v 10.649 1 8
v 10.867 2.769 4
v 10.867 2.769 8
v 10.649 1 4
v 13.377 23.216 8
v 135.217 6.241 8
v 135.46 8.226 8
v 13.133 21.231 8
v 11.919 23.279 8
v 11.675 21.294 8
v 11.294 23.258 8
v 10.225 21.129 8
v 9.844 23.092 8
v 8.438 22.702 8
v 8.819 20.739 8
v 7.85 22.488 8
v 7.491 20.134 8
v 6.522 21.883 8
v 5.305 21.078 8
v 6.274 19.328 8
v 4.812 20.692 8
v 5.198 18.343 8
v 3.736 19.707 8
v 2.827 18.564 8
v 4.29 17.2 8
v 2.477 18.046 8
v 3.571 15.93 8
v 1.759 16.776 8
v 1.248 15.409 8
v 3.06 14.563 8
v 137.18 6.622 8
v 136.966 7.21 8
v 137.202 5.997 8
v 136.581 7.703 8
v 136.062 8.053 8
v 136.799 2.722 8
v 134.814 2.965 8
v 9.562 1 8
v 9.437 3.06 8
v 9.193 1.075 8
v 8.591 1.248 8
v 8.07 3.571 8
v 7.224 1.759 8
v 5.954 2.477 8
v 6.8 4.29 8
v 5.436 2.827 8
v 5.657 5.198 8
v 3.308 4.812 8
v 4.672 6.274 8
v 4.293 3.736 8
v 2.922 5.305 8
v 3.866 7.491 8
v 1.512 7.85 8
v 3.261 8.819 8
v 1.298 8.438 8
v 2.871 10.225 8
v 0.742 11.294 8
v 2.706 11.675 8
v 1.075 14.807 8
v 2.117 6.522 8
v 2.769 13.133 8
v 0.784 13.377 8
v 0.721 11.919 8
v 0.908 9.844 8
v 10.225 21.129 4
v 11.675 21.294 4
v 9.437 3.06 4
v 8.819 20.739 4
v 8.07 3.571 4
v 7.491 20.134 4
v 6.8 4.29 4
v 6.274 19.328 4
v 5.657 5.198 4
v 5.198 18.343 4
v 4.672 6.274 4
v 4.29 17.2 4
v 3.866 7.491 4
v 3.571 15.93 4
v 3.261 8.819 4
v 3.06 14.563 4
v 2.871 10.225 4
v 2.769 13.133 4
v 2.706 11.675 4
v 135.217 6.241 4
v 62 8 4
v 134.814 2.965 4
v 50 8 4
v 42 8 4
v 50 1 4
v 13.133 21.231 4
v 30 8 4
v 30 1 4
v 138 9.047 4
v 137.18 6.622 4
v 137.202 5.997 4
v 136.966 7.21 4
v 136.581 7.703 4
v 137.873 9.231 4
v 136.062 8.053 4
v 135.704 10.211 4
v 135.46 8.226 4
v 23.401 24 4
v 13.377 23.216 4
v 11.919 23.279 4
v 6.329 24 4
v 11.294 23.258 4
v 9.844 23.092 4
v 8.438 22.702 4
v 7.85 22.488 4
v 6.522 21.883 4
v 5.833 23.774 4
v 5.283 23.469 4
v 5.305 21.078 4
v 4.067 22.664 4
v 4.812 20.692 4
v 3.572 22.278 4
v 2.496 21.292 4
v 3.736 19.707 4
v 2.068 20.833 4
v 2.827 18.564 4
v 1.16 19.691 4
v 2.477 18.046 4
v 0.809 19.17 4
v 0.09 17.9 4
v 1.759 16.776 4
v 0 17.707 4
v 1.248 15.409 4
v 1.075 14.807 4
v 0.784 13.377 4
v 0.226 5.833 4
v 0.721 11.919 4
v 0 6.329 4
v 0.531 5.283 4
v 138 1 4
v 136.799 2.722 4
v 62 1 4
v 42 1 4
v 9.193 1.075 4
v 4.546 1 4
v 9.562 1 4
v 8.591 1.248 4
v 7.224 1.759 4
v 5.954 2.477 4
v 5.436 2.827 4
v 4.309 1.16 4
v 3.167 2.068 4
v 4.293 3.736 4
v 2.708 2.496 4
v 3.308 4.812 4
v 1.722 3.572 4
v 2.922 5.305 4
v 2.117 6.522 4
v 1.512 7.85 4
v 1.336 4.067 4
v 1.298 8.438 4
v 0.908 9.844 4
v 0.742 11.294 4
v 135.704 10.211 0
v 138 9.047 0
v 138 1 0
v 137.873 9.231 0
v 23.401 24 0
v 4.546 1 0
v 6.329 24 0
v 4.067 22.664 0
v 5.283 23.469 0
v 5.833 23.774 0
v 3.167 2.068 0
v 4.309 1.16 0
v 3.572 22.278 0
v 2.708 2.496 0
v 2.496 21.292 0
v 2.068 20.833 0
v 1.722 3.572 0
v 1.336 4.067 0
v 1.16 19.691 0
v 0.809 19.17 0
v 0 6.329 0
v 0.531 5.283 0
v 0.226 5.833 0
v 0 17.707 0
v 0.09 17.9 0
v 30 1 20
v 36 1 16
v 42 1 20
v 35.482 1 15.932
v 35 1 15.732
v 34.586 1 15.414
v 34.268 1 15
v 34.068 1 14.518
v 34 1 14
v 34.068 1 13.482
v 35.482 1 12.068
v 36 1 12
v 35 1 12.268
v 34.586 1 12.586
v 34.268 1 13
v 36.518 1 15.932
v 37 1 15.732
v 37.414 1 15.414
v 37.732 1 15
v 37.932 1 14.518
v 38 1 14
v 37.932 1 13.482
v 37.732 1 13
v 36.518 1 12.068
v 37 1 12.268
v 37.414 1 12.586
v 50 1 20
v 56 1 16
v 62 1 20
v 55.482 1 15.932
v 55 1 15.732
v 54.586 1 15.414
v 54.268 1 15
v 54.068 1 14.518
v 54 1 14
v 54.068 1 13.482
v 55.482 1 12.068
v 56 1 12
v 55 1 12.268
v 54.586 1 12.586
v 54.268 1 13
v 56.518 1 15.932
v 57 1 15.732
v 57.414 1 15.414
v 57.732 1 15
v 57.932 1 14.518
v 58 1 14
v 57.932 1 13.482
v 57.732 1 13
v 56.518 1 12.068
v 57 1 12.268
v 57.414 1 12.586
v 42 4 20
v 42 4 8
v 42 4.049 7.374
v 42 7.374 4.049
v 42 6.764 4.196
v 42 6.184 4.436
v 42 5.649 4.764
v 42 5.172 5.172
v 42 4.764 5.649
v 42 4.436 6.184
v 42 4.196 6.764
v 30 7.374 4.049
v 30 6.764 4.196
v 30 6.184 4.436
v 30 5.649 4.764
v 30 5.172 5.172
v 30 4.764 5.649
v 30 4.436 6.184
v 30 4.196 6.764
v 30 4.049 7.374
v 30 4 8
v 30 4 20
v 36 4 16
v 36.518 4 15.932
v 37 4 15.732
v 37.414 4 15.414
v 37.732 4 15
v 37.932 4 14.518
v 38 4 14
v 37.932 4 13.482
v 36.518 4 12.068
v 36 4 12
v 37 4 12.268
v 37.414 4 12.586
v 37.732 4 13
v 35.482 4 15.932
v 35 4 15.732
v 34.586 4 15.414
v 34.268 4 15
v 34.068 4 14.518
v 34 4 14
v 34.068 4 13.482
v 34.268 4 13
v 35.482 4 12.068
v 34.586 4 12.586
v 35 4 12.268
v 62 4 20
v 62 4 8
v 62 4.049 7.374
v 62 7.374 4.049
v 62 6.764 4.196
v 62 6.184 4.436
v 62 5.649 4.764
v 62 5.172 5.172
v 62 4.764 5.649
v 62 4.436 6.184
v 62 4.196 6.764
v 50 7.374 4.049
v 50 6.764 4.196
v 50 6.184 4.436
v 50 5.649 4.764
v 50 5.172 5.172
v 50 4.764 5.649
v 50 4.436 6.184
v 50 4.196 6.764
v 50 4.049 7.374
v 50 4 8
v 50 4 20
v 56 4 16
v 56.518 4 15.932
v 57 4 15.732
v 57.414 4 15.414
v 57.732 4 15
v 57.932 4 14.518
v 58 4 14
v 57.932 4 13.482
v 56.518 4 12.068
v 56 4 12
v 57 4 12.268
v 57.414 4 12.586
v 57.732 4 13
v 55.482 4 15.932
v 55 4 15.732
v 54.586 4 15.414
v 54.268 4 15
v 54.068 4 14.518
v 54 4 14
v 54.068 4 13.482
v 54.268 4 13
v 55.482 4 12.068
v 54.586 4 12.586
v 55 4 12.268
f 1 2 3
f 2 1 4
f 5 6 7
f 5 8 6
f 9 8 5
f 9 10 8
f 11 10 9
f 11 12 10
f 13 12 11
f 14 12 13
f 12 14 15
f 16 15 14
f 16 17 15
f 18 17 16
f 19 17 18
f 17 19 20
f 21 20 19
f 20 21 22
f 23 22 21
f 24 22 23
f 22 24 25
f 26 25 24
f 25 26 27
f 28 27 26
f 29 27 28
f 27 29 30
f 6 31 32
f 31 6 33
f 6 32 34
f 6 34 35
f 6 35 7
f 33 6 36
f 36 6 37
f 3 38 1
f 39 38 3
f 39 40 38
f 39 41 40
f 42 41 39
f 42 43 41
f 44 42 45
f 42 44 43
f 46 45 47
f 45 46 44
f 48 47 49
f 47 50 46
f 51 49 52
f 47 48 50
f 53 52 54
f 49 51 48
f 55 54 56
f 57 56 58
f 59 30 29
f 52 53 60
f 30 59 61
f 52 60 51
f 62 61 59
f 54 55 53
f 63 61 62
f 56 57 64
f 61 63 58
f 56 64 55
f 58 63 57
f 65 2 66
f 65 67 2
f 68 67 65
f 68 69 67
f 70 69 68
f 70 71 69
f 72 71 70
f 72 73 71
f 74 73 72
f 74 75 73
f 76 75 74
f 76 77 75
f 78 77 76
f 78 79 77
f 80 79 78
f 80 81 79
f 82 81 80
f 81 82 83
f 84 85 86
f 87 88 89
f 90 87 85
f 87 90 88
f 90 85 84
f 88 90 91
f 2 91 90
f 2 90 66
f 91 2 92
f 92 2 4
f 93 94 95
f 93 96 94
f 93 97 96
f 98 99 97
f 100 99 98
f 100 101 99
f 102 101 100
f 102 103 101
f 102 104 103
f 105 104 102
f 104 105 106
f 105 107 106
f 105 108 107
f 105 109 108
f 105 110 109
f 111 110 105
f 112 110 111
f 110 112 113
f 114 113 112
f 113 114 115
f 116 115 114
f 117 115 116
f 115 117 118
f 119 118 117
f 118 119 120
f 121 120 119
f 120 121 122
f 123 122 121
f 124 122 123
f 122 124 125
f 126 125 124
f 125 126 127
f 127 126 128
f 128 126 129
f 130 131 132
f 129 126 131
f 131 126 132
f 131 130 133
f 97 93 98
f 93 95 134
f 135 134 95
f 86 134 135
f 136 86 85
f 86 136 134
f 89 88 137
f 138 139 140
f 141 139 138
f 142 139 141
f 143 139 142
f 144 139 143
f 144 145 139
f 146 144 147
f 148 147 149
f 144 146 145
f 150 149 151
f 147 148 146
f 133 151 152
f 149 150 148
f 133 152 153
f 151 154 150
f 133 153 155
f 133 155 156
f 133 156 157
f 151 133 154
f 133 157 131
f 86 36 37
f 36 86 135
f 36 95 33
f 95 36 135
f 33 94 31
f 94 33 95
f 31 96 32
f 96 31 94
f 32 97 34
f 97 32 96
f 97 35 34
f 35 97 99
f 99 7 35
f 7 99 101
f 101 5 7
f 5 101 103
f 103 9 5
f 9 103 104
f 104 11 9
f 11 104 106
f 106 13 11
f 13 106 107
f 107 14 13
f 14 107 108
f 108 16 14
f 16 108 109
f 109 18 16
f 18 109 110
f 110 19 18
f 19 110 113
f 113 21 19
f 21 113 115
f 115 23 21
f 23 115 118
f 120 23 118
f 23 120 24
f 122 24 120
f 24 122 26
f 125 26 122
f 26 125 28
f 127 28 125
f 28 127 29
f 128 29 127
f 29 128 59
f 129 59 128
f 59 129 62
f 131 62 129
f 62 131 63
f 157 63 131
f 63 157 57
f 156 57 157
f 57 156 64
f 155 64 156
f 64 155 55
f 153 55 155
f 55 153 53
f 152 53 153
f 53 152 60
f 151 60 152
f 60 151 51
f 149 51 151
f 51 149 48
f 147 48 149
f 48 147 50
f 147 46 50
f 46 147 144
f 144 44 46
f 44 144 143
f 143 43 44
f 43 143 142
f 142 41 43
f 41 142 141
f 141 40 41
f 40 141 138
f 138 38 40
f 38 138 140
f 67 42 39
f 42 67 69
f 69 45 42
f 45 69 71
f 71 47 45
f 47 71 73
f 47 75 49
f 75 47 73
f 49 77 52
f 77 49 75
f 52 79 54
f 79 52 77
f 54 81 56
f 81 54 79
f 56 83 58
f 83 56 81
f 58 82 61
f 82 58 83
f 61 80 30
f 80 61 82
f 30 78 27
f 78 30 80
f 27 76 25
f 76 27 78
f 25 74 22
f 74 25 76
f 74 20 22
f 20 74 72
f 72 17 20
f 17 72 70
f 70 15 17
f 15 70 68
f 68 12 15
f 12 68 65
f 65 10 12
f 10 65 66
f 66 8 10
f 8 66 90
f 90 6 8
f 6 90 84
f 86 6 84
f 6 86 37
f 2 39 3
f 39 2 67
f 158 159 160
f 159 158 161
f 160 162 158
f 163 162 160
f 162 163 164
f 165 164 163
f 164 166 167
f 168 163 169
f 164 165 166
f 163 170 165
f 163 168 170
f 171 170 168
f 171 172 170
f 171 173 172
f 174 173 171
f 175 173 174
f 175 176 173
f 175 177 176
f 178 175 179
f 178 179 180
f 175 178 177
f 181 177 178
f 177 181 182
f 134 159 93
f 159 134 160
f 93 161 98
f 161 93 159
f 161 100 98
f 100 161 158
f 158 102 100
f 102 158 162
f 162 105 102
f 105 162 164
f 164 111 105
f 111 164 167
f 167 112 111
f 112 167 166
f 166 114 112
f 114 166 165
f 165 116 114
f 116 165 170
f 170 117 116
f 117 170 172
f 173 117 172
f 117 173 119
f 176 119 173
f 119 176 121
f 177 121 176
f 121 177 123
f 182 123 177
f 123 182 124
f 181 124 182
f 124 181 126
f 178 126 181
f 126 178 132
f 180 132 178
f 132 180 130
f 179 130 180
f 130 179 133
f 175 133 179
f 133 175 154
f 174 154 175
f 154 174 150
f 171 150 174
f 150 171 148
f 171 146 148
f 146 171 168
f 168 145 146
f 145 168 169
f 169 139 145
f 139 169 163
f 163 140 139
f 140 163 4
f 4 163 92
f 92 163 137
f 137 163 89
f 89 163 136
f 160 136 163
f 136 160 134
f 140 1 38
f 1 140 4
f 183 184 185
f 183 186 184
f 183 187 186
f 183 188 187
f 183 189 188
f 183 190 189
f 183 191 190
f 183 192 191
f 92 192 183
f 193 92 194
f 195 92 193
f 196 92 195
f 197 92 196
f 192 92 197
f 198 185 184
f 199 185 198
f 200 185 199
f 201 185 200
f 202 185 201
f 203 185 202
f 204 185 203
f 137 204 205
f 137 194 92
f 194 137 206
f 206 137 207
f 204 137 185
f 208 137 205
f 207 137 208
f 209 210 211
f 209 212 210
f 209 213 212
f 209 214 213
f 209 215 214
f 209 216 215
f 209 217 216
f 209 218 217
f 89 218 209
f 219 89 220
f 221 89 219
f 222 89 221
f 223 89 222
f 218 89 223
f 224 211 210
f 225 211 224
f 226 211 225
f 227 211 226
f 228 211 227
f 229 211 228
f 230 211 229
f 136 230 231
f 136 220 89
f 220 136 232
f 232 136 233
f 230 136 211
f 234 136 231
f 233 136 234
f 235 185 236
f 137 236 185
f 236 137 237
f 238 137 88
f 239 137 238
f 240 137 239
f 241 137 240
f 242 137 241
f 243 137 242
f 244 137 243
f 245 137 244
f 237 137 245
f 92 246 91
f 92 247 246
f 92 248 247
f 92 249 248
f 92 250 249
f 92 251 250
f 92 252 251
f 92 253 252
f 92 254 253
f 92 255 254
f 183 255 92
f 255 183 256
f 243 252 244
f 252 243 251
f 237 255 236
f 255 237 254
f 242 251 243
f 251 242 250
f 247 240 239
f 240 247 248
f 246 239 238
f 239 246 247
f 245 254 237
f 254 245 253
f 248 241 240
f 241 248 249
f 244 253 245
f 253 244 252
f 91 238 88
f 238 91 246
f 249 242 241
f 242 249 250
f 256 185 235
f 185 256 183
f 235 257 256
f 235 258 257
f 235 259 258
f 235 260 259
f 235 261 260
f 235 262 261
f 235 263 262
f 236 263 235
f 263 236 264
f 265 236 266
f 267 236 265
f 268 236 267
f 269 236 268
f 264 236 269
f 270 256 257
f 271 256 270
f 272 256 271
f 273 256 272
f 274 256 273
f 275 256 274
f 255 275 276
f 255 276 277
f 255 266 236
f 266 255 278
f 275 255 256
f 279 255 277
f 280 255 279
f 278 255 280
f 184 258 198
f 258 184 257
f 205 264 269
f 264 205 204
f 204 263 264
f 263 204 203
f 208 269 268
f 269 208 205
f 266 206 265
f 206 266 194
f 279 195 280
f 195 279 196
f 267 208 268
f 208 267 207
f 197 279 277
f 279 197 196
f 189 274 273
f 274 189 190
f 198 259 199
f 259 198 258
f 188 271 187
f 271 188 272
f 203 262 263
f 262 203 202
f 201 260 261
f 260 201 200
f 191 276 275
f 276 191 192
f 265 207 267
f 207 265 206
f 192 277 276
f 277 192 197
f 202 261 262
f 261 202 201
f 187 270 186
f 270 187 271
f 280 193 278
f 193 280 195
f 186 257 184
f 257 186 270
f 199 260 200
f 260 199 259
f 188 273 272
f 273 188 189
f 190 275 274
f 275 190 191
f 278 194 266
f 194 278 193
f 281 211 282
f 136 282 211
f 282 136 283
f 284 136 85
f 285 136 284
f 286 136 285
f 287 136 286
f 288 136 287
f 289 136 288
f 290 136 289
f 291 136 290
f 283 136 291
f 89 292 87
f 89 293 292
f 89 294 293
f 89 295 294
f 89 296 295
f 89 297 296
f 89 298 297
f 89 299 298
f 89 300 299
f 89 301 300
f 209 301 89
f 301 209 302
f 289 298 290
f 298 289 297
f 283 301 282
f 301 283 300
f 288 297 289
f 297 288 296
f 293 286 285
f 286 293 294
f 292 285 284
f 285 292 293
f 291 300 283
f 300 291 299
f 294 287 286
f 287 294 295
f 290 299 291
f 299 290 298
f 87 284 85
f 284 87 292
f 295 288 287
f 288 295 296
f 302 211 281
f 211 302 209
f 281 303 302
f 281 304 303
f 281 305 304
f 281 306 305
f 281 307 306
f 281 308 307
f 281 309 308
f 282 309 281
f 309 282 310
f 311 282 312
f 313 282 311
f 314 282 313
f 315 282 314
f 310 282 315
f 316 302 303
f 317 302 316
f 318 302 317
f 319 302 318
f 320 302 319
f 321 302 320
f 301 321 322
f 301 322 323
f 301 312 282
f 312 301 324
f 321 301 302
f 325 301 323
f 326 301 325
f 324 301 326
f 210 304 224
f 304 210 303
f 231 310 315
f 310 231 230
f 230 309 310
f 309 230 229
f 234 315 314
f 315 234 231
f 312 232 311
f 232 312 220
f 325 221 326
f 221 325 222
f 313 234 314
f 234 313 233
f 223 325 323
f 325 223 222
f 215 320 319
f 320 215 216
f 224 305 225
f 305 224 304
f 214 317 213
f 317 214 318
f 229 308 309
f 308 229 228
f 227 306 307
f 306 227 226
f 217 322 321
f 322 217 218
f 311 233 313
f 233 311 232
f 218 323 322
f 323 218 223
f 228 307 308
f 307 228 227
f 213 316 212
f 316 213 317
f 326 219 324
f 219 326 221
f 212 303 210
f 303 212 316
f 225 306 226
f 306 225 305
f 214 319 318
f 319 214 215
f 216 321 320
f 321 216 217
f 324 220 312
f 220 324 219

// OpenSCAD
boff=1;
intersection() {
  translate([0,boff]) cube([140,24,20]);
  union(){
linear_extrude(4) {
  intersection() {
  square([138,24]);
  translate([12,12]) rotate([0,0,-7]) offset(4) keyboard_profile();
  }
}
translate([12,12,4]) rotate([0,0,-7]) {
  //linear_extrude(4) keyboard_profile();
 intersection() {
   union(){
     translate([-12,-12]) cube([12,24,4]);
     translate([0,6]) cube([130,10,4]);
   }
linear_extrude(4,convexity=10) difference() {
  minkowski() {
    keyboard_profile();
    circle(d=4,$fn=20);
  }
  keyboard_profile();
}
}
}
}
}
  translate([19,boff]) cube([110,7,4]);
  translate([19,boff]) cube([40,11,4]);
for(x=[30,50]) translate([x,boff,4]) {
  *translate([0,0,-4]) cube([8,4,8]);
  difference(){
    cube([12,7,4]);
    translate([-.01,7,4]) rotate([0,90]) cylinder(d=8,h=13,$fn=40);
  }
  difference() {
    cube([12,3,16]);
    translate([6,-.01,10]) rotate([-90,0]) cylinder(d=4,h=3.02,$fn=24);
  }
}
/*
difference() {
  union(){
    square([140,10]);
    square([30,24]);
  }
  translate([12,12]) rotate([0,0,-7]) 
    keyboard_profile();
//*
}
//*/

module keyboard_profile()
{
  //translate([10,10])
  {
    circle(d=18.6,$fn=40);
    translate([4.65,0]) square([4.65,9.3]);
    translate([9.3,2.65])
      difference() {
        square([2.4,2.4]);
        translate([2.4,0]) circle(r=2.4,$fn=30);
      }
    translate([0,5]) square([123,4.3]);
  }
}
